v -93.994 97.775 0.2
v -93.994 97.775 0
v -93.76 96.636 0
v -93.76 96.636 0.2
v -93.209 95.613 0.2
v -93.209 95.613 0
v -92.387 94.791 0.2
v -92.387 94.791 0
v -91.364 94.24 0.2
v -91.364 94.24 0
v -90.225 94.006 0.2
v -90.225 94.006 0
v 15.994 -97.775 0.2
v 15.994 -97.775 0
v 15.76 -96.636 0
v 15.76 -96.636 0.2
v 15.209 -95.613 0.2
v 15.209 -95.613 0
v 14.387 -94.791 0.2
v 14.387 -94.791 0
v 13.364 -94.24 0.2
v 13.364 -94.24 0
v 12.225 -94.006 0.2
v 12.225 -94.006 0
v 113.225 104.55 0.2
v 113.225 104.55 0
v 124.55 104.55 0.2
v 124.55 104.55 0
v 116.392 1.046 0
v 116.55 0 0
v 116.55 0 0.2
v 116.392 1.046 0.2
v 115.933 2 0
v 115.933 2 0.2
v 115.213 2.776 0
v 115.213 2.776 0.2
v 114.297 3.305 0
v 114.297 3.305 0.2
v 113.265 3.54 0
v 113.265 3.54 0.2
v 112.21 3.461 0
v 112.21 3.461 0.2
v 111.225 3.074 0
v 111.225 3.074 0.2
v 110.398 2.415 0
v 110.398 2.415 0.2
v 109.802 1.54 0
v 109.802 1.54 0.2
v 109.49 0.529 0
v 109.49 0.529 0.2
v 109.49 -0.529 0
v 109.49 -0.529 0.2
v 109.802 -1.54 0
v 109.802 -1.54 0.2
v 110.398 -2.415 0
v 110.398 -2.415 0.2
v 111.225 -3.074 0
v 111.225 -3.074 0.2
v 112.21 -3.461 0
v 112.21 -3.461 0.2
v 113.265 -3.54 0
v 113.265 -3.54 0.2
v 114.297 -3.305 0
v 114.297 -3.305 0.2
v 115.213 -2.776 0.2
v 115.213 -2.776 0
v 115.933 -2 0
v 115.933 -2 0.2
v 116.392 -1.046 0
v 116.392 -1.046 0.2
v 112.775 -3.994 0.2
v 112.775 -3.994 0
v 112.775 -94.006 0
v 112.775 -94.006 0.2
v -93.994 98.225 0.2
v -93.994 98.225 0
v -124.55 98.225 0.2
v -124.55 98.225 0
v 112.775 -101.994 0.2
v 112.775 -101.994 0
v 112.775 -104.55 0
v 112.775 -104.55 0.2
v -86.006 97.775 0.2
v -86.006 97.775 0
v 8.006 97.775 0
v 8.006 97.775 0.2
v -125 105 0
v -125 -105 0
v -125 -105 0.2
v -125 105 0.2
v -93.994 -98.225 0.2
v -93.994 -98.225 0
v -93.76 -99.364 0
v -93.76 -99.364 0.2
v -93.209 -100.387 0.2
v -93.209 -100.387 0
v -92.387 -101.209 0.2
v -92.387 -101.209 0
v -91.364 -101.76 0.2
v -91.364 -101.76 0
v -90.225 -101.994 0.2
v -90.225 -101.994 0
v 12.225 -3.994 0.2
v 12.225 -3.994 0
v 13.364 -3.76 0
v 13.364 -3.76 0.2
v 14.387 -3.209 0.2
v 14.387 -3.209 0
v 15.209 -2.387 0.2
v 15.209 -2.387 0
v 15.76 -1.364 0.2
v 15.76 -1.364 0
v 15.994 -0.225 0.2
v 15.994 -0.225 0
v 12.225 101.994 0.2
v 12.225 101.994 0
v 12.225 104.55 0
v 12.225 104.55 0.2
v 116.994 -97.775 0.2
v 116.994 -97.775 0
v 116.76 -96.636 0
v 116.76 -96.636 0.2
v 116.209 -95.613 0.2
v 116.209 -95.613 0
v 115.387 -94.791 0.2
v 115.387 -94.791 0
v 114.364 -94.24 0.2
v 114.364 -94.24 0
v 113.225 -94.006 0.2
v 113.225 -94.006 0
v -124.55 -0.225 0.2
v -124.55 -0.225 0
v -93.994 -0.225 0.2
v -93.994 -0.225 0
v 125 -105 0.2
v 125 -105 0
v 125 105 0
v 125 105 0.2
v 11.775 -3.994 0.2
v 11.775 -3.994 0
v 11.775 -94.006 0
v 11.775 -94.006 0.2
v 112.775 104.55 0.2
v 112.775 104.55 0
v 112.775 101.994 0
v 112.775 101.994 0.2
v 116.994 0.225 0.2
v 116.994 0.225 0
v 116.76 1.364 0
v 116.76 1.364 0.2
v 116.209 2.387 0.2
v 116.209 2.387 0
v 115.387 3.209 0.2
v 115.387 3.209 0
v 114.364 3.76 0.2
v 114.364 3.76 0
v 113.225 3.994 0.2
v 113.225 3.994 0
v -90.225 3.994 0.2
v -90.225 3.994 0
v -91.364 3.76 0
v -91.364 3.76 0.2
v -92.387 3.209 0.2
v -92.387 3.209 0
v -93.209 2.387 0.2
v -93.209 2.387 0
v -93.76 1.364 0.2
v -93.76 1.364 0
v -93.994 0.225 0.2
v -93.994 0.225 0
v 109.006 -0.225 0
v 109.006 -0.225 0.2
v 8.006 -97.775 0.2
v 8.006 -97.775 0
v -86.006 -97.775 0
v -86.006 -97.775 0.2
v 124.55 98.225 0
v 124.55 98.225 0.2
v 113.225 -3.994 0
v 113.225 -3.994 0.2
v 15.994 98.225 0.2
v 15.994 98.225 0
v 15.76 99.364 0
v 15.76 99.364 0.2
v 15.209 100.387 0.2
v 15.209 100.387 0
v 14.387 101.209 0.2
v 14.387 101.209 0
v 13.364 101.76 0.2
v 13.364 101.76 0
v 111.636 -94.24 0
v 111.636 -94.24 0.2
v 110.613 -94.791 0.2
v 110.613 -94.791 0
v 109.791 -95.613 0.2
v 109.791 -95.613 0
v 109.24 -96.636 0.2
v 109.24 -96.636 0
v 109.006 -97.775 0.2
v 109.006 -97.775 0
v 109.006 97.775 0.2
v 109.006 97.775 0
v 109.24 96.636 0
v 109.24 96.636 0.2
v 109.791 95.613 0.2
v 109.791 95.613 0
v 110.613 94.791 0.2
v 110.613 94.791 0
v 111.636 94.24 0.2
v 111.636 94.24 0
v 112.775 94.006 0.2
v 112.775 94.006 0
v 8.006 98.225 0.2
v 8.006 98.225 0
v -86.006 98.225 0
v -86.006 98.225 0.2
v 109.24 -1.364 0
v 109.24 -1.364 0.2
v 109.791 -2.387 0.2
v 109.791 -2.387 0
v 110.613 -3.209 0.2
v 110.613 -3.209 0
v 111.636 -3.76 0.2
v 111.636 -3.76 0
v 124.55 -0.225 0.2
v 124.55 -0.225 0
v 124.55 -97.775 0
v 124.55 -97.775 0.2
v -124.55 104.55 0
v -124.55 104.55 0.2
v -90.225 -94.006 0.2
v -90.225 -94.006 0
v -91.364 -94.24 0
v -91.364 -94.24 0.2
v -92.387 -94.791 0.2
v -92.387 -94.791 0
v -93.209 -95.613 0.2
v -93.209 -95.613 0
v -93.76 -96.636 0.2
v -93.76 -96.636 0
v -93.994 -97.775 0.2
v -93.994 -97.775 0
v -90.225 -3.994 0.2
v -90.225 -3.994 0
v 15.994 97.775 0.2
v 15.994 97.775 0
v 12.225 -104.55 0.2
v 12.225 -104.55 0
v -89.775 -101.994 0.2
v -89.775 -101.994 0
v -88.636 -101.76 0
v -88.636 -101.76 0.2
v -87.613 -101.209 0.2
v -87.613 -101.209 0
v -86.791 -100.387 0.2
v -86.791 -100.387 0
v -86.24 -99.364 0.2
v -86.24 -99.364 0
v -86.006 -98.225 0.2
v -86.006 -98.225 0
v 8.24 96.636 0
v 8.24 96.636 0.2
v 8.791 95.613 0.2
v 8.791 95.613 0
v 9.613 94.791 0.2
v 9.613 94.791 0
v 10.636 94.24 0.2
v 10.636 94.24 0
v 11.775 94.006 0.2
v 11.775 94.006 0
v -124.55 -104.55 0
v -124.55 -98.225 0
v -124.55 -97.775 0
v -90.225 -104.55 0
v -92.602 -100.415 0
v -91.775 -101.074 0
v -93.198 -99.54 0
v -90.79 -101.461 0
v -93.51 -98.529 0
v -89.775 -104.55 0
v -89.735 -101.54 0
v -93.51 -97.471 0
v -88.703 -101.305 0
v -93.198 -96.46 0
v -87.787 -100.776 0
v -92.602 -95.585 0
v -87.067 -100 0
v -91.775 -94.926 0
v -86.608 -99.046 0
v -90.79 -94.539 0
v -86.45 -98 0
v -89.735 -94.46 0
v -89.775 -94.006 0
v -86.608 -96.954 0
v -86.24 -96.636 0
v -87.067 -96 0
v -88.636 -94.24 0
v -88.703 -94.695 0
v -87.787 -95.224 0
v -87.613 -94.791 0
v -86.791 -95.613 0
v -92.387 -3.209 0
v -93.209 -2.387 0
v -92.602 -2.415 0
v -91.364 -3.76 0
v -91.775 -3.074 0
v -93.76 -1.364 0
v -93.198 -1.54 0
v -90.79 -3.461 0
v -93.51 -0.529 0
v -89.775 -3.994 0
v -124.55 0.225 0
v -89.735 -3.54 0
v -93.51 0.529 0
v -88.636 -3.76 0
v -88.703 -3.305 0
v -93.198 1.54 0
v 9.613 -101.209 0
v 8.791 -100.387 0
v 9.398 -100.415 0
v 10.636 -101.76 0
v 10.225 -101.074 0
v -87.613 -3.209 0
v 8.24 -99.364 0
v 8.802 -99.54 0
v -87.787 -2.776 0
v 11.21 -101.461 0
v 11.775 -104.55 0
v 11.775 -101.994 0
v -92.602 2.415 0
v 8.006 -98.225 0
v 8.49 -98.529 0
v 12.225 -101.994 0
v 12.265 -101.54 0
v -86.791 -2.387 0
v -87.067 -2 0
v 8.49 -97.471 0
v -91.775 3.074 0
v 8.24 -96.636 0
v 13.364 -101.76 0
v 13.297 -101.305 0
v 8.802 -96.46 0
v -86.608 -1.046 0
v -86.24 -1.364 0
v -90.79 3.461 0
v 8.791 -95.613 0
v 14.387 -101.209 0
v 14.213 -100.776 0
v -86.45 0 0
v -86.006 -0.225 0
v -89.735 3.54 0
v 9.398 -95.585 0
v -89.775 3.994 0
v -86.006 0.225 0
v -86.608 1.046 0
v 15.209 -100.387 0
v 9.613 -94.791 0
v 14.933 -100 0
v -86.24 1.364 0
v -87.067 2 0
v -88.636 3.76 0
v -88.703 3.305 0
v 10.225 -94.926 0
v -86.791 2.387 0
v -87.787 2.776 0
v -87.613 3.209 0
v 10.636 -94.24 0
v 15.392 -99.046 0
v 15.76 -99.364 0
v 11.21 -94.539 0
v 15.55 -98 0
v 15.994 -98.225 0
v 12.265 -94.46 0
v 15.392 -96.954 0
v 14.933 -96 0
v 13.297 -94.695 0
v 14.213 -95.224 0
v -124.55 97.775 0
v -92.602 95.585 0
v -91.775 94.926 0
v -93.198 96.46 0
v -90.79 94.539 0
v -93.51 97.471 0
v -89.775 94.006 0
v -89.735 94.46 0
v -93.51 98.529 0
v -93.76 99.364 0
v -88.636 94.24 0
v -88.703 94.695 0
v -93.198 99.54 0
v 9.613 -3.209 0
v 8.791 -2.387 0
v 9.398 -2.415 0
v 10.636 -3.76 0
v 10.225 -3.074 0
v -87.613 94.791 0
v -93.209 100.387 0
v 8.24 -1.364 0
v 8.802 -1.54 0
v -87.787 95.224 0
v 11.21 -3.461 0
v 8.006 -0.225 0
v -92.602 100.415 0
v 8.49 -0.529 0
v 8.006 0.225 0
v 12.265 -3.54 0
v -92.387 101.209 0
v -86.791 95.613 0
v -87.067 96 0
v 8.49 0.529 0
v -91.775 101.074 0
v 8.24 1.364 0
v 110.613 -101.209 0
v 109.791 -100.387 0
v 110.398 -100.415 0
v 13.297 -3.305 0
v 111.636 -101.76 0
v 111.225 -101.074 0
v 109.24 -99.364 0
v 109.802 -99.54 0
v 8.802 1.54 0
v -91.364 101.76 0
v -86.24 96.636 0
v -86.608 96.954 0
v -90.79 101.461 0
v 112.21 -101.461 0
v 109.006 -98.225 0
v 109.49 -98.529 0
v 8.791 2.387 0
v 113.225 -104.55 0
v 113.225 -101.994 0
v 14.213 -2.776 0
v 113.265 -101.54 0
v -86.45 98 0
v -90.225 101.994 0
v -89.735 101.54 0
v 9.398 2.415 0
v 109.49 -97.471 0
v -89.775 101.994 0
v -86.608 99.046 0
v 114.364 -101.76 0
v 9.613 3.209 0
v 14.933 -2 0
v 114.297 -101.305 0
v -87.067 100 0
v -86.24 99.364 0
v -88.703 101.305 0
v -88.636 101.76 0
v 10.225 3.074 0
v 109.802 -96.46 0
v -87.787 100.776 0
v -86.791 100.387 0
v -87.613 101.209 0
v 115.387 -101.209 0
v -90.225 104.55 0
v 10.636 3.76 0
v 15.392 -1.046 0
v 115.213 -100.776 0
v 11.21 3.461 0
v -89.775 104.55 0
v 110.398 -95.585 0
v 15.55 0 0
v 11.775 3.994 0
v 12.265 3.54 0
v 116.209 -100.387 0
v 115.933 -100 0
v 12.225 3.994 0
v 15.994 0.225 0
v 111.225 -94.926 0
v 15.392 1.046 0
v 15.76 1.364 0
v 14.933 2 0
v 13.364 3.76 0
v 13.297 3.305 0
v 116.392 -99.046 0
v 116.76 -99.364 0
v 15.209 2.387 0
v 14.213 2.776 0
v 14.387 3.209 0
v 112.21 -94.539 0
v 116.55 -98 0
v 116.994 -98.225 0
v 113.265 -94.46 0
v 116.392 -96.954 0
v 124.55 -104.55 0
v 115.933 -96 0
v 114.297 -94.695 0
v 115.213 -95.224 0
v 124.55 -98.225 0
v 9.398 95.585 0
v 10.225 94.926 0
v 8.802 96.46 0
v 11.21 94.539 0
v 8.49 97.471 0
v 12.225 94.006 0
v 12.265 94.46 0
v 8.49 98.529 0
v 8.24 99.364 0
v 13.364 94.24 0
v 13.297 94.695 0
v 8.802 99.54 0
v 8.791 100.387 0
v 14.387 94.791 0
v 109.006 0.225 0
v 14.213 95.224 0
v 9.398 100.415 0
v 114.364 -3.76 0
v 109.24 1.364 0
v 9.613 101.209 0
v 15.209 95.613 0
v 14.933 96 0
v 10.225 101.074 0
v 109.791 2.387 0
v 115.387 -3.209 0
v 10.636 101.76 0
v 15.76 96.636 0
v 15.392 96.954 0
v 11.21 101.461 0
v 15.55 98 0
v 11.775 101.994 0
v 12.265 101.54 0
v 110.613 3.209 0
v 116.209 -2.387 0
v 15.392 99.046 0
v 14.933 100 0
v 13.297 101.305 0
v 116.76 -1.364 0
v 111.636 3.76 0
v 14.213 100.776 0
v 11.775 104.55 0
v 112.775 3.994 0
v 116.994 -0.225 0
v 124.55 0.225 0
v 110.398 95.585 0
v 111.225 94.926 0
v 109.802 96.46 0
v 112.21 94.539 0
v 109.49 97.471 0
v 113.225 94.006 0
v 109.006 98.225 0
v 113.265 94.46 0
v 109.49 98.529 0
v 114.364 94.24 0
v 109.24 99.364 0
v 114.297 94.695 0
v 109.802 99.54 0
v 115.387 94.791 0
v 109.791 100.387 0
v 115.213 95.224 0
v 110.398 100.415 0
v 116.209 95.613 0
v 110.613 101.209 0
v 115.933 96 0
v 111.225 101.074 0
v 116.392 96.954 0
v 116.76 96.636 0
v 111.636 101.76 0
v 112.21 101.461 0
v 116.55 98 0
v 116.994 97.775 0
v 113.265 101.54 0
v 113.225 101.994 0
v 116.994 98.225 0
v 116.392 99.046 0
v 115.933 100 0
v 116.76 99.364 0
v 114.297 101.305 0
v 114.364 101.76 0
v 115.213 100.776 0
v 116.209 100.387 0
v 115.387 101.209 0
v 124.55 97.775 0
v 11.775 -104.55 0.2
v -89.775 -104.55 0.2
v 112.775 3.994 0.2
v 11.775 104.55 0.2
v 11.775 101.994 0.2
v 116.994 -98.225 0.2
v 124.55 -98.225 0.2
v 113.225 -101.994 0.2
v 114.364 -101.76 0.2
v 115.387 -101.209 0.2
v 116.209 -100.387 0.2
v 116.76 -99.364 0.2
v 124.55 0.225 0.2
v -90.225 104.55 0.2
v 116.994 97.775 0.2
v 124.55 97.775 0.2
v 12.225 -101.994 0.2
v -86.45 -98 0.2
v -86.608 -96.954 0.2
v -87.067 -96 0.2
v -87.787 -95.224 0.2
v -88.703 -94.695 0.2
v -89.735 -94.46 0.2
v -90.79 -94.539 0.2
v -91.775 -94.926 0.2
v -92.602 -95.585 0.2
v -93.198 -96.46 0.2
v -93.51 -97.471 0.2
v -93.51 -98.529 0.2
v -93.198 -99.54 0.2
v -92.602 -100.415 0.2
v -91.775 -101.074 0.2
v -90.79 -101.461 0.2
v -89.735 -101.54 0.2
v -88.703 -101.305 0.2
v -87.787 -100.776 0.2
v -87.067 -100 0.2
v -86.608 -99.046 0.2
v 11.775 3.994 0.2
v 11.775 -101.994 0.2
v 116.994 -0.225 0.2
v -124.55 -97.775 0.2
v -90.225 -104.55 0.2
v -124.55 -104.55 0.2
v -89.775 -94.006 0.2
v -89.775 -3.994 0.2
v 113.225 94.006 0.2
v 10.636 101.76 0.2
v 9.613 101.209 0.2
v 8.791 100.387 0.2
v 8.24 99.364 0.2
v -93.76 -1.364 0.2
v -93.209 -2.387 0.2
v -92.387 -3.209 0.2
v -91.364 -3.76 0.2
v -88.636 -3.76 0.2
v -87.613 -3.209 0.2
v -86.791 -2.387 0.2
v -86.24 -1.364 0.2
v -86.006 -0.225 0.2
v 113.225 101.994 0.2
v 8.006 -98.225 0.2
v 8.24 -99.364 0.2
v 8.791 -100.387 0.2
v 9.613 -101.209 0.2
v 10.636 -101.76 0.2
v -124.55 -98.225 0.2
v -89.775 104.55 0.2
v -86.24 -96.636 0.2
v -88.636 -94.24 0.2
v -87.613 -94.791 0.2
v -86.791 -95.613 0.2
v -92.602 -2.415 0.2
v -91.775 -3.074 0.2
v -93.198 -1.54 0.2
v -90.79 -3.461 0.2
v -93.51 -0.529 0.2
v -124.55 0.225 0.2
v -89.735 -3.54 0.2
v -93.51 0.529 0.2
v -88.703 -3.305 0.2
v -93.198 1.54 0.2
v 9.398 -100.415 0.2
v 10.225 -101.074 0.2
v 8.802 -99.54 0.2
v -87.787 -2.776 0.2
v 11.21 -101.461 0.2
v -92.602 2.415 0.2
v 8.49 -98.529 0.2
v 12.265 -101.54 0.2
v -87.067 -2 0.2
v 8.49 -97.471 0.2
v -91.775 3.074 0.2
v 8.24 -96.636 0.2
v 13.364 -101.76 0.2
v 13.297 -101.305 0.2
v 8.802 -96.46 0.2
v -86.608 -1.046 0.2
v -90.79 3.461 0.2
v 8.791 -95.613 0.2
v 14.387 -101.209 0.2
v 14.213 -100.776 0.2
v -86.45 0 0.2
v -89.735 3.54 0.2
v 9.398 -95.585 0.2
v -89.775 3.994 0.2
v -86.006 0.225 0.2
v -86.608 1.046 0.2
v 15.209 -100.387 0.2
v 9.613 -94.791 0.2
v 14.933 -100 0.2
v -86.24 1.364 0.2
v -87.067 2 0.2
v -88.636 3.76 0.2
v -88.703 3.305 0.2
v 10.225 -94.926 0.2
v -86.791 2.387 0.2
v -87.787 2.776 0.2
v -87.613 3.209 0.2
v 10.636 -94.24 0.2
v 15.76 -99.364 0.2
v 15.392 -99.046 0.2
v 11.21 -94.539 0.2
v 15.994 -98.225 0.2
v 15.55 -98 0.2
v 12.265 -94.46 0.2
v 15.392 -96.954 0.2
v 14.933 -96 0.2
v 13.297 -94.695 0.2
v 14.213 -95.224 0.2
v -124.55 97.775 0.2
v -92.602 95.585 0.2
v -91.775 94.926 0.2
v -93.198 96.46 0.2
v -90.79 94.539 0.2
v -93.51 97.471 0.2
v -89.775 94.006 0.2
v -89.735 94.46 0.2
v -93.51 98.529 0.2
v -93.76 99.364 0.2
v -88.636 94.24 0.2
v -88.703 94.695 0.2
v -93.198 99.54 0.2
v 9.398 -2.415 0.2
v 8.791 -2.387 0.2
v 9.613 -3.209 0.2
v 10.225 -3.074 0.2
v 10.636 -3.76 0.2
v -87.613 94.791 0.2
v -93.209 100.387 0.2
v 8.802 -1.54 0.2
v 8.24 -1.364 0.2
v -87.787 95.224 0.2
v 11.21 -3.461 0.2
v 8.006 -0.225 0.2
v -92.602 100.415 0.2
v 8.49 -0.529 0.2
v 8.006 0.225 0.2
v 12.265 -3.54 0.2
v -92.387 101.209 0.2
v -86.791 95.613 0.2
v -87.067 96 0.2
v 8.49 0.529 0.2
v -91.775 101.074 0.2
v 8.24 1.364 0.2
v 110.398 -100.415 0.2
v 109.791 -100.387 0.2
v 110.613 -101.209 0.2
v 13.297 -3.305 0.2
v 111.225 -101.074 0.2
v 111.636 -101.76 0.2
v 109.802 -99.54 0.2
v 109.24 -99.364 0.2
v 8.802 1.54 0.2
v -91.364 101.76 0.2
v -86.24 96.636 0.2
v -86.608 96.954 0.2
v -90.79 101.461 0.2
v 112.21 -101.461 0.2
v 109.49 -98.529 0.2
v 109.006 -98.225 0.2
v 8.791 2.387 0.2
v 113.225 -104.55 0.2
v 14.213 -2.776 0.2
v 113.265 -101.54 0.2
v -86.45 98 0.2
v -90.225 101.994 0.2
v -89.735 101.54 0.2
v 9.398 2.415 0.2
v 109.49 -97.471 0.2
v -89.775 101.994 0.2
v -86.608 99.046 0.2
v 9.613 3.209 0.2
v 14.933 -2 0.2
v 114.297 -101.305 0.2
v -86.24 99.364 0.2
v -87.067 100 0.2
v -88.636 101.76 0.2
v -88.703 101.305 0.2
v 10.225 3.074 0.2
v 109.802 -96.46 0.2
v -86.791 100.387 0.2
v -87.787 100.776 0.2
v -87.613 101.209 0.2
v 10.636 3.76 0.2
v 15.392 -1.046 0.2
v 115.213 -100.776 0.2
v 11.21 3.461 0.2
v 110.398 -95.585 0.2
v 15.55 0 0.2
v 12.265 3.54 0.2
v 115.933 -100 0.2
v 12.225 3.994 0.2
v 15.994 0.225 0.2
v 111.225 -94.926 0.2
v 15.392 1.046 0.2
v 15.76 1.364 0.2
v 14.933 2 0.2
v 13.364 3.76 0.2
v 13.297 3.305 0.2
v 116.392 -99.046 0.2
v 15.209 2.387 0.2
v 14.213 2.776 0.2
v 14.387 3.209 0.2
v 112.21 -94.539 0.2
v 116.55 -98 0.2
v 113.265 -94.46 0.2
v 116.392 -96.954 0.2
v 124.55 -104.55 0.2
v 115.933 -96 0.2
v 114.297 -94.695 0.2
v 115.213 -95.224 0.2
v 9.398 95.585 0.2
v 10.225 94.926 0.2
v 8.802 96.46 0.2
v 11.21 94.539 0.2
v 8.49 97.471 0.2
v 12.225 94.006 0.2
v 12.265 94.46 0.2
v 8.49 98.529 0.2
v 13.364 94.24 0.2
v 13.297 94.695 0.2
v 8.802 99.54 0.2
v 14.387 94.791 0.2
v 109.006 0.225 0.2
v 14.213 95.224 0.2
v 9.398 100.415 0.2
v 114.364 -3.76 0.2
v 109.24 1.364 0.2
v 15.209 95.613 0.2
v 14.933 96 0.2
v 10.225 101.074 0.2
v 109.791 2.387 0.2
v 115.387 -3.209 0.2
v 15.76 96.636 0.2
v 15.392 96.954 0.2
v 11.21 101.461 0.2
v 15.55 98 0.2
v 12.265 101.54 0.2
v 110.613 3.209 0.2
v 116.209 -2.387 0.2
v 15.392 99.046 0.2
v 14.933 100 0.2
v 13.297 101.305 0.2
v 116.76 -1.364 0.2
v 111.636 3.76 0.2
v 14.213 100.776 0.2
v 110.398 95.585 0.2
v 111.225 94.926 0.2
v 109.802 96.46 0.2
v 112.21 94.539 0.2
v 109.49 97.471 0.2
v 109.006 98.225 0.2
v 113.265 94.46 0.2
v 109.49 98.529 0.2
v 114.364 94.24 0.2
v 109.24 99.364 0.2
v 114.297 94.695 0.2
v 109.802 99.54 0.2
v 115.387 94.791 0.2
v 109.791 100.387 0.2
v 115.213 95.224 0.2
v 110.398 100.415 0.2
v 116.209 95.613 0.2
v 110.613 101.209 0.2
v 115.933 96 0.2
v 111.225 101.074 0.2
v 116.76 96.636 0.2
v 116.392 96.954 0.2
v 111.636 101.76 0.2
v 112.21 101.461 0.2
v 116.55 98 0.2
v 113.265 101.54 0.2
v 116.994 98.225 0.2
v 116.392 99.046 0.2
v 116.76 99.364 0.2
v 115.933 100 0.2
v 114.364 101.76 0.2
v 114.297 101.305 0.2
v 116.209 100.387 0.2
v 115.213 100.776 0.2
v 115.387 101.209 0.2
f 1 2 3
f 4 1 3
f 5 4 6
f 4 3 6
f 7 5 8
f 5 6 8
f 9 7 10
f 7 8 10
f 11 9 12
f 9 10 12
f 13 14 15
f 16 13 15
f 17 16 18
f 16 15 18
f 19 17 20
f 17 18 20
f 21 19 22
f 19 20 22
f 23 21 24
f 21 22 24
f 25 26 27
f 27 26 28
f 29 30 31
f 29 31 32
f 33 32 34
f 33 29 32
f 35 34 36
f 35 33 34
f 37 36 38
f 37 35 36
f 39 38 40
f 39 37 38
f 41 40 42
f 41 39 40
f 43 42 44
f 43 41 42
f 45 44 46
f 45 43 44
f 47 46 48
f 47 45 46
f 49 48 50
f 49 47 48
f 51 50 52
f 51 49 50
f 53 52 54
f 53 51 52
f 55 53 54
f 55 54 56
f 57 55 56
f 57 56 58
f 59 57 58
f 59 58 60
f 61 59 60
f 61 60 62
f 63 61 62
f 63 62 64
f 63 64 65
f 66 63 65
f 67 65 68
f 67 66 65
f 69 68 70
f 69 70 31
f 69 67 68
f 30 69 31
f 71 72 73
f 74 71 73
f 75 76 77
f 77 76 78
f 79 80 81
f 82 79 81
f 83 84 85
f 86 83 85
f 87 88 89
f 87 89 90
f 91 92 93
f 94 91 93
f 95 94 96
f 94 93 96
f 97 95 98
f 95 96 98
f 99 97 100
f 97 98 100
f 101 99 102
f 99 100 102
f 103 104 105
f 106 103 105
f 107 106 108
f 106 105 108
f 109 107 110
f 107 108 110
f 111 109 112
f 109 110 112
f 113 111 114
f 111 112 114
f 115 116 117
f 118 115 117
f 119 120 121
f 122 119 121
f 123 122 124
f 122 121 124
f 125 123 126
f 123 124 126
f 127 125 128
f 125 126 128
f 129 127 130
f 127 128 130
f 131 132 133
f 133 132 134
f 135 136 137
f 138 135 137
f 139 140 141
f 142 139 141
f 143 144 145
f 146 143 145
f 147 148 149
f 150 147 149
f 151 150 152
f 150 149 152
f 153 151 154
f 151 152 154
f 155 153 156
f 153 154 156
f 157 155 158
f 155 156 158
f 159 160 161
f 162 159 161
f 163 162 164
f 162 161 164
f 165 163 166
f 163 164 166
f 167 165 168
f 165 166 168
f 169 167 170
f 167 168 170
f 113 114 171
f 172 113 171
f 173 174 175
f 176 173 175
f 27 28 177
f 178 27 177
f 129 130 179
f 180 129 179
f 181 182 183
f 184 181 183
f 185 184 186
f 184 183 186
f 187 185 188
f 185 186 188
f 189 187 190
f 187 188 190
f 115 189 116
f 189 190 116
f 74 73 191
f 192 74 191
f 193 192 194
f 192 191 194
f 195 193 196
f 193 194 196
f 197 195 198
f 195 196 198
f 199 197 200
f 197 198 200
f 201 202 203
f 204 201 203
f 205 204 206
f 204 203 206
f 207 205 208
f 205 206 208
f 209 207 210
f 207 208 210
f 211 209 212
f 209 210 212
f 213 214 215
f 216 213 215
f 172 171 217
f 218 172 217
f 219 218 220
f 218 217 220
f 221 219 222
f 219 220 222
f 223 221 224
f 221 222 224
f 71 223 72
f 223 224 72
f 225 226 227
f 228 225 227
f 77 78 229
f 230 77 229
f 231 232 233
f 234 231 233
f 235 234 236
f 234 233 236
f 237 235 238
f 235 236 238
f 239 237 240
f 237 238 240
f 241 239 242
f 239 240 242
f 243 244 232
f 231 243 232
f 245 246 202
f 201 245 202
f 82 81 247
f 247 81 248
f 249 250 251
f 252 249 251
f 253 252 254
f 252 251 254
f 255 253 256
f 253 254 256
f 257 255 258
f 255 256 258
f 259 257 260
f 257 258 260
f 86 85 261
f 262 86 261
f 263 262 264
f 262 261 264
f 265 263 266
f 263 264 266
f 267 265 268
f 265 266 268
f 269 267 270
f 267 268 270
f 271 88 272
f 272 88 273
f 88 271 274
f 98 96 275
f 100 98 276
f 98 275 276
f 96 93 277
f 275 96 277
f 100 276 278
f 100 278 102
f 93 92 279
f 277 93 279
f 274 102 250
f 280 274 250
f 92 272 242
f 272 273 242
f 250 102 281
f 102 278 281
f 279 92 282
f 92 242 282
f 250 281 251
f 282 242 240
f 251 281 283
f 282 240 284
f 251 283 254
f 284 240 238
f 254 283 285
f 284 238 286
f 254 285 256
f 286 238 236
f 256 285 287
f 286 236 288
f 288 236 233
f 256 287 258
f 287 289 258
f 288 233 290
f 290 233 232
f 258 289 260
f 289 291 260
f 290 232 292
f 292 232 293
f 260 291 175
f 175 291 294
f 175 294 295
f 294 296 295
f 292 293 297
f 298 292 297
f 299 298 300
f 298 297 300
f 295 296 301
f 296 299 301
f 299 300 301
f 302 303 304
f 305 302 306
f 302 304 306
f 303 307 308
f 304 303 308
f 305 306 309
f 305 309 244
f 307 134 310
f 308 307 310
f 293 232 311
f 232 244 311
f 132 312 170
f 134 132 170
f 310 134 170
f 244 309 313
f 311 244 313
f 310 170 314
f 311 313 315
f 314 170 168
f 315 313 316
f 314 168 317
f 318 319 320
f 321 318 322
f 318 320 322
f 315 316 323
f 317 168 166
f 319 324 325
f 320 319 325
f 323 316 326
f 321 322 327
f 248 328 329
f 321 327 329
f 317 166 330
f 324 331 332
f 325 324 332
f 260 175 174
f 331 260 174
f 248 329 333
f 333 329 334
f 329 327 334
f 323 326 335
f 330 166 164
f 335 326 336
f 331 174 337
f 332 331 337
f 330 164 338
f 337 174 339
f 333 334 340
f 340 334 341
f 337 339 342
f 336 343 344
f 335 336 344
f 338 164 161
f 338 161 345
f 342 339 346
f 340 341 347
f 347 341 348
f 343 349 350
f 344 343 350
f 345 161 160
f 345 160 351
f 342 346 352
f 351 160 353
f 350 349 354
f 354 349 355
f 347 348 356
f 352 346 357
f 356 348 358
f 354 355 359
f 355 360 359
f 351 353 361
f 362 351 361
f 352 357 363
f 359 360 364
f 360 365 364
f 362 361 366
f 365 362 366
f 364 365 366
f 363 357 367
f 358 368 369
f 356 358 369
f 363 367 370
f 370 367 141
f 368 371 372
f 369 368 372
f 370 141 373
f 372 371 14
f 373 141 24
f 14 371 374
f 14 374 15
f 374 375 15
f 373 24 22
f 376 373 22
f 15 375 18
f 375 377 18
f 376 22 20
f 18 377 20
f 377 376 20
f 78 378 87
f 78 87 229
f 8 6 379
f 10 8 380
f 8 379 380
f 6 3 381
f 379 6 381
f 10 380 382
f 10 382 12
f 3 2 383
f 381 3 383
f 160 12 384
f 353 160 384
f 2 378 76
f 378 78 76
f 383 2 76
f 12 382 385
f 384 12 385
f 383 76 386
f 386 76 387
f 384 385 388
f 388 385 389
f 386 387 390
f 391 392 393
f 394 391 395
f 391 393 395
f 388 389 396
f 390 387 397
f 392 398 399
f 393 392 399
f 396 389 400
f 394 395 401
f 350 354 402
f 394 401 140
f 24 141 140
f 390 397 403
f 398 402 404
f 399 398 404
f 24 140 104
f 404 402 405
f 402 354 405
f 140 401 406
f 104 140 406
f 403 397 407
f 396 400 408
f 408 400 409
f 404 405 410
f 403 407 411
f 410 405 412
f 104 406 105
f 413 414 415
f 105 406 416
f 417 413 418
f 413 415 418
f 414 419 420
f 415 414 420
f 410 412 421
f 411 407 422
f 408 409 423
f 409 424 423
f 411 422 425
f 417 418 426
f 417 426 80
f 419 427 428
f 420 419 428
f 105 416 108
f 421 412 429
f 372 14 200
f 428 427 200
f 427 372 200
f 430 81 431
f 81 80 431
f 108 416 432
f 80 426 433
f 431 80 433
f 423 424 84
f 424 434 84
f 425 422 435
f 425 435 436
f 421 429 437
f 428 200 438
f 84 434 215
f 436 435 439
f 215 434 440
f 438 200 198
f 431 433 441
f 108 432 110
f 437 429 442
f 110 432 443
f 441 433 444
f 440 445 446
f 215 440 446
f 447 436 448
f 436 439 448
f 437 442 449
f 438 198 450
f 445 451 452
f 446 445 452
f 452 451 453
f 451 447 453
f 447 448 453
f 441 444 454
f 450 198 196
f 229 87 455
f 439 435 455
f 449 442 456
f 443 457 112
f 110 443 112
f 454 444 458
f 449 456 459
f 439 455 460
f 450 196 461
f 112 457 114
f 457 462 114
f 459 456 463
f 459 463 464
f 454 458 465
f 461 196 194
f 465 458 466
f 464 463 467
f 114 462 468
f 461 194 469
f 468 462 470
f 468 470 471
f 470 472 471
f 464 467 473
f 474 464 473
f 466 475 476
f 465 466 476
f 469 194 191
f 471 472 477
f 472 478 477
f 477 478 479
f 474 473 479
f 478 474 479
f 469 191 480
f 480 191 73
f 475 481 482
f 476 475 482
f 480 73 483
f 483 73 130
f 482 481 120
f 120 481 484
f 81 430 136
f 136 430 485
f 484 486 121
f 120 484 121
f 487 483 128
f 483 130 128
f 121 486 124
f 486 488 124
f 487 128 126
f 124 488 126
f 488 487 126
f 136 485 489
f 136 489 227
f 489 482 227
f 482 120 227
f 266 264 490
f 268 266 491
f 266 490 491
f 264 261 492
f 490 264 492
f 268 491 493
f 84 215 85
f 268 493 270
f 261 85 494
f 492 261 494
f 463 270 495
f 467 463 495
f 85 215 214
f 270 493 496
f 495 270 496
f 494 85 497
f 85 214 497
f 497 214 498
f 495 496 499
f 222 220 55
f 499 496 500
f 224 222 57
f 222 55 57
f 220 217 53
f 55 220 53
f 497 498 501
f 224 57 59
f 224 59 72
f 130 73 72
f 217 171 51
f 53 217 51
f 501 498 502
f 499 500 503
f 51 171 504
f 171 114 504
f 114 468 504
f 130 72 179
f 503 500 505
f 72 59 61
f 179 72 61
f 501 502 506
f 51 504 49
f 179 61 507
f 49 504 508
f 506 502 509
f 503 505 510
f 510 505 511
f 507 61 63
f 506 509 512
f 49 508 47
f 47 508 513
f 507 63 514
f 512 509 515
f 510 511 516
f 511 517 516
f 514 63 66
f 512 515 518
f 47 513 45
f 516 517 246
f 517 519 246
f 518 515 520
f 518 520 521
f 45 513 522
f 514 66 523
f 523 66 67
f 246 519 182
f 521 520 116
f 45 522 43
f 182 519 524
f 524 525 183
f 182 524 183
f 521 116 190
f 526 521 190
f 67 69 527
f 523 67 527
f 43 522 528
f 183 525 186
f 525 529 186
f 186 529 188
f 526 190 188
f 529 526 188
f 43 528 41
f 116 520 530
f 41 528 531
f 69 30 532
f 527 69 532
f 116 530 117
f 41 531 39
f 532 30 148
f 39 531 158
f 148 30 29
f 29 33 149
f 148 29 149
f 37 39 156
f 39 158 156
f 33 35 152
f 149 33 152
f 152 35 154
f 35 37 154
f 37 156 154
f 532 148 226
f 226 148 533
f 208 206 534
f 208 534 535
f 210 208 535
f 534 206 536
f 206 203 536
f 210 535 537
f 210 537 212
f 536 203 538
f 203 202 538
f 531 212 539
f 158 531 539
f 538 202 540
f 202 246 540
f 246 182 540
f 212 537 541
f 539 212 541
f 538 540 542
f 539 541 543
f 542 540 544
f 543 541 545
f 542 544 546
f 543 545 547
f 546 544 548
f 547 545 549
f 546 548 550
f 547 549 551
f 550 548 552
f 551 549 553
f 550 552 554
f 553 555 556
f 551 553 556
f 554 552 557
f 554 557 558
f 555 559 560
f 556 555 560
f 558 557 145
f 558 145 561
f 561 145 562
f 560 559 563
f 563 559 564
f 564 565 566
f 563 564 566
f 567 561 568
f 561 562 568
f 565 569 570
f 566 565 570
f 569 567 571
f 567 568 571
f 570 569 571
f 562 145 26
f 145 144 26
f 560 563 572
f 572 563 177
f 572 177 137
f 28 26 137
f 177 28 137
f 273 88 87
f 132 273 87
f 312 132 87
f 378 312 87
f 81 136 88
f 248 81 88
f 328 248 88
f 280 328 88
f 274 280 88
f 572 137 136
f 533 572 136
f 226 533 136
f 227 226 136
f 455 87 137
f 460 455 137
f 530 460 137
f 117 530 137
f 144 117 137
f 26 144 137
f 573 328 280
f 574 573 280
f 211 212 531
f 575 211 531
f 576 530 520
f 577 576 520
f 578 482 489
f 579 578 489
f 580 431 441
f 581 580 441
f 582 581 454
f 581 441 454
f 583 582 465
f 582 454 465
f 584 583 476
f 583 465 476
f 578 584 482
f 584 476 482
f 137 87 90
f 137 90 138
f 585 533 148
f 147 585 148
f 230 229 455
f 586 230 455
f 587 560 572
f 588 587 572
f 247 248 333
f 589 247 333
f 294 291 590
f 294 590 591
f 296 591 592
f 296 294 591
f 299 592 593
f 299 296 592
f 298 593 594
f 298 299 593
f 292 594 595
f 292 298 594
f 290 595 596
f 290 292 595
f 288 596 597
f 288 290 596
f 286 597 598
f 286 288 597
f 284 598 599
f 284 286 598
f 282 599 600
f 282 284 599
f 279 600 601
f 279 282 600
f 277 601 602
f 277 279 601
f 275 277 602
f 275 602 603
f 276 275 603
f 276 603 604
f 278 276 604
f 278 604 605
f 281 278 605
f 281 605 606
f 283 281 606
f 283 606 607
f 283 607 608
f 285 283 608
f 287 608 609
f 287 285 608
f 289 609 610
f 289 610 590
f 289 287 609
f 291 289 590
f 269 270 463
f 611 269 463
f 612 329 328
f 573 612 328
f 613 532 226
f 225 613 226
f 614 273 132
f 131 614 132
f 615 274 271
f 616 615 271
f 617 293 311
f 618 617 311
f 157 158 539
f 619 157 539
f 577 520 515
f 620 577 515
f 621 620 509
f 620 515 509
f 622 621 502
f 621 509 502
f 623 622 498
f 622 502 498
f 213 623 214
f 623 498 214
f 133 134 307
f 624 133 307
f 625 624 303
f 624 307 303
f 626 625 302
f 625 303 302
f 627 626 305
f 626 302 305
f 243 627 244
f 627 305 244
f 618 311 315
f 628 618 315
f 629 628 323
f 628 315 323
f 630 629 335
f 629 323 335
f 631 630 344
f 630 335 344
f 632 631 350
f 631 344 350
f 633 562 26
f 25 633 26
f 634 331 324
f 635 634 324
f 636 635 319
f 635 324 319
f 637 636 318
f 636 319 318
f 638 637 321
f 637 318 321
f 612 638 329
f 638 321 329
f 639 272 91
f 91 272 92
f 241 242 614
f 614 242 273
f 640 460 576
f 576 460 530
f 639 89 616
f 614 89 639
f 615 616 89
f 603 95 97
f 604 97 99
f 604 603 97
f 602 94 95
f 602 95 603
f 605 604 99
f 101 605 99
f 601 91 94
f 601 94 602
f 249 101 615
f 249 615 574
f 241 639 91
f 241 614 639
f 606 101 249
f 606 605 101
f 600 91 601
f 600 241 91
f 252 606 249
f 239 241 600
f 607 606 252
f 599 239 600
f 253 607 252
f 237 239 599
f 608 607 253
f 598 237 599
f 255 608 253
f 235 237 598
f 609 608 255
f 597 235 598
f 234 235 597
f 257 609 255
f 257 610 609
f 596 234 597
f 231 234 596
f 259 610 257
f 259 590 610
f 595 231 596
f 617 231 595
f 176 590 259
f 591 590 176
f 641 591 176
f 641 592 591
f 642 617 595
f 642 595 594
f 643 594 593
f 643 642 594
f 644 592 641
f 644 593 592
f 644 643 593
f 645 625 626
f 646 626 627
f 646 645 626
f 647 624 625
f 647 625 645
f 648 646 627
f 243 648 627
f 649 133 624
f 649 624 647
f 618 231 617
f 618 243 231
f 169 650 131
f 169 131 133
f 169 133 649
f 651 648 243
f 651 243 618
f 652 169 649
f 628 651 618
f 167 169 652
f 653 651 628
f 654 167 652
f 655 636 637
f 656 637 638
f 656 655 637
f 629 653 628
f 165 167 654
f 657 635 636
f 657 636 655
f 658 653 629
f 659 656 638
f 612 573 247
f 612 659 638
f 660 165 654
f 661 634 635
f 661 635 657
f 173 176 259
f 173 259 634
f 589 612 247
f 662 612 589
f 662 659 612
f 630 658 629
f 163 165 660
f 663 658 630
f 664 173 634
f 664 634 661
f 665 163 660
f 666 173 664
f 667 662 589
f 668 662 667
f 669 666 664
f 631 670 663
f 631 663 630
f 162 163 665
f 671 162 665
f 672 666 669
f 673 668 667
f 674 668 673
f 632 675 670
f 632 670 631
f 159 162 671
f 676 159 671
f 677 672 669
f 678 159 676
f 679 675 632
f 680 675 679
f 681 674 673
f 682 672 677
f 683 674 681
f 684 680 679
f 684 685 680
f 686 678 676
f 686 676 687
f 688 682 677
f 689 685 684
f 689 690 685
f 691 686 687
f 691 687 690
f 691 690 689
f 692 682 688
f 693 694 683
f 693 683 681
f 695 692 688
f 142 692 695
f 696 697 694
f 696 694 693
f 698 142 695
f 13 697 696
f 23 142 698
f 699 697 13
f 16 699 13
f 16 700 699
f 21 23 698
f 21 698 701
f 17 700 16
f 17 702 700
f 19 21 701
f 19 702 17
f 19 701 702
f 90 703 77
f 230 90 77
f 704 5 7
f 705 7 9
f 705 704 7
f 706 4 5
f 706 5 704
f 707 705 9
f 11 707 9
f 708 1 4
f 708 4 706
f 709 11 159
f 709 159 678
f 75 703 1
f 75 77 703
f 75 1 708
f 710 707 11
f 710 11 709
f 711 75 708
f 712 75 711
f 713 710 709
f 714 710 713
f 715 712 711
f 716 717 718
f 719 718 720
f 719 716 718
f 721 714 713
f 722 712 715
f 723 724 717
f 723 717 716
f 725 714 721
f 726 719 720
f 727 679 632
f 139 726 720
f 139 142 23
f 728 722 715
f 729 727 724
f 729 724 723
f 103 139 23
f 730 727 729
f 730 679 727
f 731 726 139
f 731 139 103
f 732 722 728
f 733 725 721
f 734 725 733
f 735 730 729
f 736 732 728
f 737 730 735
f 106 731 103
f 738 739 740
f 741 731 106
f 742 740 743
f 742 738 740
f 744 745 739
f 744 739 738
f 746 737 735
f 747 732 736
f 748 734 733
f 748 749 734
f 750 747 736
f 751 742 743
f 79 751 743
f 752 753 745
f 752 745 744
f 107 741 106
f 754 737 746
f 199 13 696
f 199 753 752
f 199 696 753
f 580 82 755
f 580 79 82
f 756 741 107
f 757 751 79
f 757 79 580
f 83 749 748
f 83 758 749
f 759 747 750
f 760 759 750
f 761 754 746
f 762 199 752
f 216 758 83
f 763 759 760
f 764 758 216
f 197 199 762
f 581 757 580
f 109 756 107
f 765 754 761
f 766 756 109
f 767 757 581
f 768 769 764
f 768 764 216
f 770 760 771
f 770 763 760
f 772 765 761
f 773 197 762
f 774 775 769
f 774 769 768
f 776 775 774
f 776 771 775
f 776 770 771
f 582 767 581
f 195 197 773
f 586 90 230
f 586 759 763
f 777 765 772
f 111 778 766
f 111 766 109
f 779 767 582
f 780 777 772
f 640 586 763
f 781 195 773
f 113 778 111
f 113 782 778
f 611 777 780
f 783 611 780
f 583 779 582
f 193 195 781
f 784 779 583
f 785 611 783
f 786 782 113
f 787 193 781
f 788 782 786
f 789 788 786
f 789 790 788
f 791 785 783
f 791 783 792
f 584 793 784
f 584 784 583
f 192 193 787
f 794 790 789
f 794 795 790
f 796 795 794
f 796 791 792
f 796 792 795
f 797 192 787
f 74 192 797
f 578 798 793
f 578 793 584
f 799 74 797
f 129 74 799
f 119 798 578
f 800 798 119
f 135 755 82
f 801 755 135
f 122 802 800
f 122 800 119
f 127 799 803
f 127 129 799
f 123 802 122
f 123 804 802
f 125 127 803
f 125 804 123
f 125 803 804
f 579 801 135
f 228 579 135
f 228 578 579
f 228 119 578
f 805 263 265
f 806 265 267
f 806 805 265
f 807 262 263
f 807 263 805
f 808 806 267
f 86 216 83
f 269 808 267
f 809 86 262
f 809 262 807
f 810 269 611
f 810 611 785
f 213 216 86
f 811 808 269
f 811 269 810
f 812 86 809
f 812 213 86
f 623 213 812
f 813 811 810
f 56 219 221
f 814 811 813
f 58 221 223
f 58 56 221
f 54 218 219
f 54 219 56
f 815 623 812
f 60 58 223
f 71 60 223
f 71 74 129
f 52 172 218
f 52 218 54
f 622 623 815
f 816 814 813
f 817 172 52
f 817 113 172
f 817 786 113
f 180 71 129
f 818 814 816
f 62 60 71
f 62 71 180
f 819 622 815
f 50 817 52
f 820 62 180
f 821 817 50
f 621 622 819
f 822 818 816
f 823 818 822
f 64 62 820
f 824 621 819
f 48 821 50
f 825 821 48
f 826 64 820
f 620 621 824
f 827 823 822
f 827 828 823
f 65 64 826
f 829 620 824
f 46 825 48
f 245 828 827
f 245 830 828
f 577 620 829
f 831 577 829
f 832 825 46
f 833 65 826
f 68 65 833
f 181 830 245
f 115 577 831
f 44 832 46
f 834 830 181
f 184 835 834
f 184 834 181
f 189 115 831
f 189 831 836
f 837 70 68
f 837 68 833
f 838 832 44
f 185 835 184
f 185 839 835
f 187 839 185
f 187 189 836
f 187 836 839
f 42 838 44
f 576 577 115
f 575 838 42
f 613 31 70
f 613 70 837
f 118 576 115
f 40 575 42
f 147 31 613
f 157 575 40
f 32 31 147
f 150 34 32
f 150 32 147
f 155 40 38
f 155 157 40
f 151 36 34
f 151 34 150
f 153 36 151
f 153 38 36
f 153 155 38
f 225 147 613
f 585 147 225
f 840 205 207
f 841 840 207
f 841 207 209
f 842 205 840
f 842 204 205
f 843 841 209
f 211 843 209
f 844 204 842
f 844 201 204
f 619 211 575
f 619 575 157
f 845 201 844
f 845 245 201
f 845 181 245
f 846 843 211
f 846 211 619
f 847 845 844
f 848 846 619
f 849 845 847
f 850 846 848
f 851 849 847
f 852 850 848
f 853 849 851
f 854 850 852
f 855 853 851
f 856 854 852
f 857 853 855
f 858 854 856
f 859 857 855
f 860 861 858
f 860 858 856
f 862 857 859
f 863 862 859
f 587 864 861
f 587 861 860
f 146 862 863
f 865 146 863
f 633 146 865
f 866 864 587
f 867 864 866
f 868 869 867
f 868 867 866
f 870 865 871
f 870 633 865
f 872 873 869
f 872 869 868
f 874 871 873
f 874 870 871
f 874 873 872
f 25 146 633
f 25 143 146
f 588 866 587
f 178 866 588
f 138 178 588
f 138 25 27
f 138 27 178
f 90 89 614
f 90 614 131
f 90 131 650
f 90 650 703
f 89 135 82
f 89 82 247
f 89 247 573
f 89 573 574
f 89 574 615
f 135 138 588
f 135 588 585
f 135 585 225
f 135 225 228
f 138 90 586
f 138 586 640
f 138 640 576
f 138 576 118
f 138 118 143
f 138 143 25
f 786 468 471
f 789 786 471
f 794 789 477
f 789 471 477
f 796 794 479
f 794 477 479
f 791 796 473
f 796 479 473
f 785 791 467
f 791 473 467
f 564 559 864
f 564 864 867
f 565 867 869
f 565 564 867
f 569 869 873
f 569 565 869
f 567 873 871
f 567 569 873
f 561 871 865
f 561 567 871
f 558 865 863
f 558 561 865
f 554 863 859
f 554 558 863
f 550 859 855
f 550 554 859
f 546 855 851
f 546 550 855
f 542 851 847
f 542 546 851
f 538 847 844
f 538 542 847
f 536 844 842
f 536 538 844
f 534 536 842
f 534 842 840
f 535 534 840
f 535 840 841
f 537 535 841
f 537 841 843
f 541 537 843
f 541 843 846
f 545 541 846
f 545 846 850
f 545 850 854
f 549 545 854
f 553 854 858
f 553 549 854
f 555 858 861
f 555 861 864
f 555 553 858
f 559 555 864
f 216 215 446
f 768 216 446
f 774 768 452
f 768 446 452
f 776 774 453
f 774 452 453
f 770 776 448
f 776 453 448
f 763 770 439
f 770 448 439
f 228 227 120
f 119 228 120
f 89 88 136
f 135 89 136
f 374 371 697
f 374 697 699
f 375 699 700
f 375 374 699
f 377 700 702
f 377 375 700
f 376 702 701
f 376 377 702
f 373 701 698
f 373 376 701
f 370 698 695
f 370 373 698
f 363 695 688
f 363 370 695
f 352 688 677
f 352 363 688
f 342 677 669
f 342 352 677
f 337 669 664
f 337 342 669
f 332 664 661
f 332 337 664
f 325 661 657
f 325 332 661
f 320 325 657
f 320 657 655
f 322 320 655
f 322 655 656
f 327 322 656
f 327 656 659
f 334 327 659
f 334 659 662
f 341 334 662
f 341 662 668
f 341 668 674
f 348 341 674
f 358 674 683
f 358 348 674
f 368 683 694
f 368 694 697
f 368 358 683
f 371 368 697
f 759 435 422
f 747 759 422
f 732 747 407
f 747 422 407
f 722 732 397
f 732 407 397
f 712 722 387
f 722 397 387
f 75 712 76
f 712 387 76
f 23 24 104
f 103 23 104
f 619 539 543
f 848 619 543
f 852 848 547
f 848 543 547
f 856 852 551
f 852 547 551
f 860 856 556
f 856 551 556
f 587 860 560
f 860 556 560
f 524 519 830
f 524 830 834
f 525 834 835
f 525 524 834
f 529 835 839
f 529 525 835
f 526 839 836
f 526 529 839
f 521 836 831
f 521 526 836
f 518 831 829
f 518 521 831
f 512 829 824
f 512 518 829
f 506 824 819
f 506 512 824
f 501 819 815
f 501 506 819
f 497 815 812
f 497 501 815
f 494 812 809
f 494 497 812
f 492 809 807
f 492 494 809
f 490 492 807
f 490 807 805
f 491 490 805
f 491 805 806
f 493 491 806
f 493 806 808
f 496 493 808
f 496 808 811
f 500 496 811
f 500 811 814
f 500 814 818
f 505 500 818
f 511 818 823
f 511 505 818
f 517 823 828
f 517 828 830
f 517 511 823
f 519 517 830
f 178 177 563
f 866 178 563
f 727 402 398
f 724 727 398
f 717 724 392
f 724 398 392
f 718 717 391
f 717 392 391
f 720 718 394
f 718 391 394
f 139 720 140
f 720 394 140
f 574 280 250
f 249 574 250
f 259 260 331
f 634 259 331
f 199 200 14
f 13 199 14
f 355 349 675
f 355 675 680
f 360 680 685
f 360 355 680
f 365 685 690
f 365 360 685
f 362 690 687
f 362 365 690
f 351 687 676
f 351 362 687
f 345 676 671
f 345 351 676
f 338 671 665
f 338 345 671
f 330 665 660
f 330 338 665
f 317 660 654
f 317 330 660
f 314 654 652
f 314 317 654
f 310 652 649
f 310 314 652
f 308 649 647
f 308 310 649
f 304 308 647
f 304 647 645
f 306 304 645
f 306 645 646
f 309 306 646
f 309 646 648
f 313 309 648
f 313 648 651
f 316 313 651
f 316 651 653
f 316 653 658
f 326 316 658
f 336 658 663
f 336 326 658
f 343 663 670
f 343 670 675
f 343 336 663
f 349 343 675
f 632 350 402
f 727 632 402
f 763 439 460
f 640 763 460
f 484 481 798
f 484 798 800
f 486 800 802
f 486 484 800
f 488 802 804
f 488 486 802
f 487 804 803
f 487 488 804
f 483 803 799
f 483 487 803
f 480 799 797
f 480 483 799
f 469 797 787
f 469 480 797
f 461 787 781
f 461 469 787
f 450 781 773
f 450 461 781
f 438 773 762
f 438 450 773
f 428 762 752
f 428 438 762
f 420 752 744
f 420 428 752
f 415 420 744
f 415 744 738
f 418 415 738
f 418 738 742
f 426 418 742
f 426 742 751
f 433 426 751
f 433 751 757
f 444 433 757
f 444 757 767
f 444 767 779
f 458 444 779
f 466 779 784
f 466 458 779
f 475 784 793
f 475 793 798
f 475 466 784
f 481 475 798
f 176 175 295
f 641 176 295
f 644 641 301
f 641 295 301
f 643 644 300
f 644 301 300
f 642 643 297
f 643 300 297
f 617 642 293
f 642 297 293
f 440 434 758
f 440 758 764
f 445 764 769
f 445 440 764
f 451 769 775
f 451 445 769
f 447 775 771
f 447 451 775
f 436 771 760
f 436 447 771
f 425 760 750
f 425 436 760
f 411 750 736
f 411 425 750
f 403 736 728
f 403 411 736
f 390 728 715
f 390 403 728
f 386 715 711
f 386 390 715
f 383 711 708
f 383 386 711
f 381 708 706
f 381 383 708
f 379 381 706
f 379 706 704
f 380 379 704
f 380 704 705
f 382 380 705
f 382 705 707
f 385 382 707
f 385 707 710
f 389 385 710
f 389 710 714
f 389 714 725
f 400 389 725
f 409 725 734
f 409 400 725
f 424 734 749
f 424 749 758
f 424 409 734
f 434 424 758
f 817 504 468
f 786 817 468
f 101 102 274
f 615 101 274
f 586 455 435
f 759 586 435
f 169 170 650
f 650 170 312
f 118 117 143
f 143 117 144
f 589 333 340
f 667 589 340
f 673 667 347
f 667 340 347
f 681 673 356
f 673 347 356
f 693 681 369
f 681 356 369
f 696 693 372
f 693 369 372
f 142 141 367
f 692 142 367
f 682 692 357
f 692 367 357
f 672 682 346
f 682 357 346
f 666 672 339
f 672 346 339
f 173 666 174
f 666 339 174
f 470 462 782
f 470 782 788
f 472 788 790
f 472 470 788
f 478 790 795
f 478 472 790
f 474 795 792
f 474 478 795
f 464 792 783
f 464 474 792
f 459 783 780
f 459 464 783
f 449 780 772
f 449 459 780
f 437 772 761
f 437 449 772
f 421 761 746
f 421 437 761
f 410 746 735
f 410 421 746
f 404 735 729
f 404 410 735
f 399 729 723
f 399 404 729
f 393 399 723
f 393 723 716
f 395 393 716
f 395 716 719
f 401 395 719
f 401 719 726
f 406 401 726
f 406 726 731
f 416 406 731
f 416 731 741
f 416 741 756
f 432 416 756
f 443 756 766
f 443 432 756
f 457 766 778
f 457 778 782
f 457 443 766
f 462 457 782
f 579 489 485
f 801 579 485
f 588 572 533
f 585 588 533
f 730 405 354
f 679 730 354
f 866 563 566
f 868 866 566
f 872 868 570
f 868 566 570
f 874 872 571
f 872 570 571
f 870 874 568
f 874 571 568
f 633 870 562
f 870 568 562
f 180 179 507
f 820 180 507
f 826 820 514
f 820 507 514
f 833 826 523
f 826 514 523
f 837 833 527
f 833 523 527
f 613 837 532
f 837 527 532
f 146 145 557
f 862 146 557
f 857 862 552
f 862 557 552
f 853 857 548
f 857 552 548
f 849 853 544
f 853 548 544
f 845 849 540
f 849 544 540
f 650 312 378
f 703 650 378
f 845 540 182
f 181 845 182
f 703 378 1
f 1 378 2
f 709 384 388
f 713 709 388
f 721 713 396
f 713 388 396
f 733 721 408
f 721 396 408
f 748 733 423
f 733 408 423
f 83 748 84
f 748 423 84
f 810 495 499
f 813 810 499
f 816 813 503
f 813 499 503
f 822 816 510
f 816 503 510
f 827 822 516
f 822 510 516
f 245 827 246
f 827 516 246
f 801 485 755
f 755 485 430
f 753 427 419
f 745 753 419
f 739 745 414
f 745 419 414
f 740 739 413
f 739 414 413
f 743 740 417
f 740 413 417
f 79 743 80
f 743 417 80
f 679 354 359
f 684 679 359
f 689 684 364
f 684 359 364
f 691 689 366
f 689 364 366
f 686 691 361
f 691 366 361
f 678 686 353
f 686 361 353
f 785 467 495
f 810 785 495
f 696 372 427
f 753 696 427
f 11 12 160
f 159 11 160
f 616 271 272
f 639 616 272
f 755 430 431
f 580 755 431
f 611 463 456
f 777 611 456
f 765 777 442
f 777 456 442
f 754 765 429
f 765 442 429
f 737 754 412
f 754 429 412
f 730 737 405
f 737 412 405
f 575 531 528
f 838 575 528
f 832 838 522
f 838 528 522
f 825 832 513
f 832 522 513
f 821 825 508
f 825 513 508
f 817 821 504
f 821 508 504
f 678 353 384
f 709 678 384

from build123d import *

# Parameters (mm, degrees)
F0_W     = 250
F0_H     = 210
F0_R     = 3.55
F1_DEPTH = 0.2


with BuildPart() as f1:
    # F0 (on Top) → F1 (new body)
    with BuildSketch(Plane.XY):
        Rectangle(F0_W, F0_H)
        with BuildLine():
            Line((-90.225, -104.55), (-124.55, -104.55))
            Line((-124.55, -104.55), (-124.55, -98.225))
            Line((-124.55, -98.225), (-93.993667, -98.225))
            ThreePointArc((-93.993667, -98.225), (-92.828427, -100.828427), (-90.225, -101.993667))
            Line((-90.225, -101.993667), (-90.225, -104.55))
        make_face(mode=Mode.SUBTRACT)
        with Locations((-90, -98)):
            Circle(F0_R, mode=Mode.SUBTRACT)
        with BuildLine():
            Line((-86.006333, -98.225), (8.006333, -98.225))
            ThreePointArc((8.006333, -98.225), (9.171573, -100.828427), (11.775, -101.993667))
            Line((11.775, -101.993667), (11.775, -104.55))
            Line((11.775, -104.55), (-89.775, -104.55))
            Line((-89.775, -104.55), (-89.775, -101.993667))
            ThreePointArc((-89.775, -101.993667), (-87.171573, -100.828427), (-86.006333, -98.225))
        make_face(mode=Mode.SUBTRACT)
        with BuildLine():
            Line((-124.55, -0.225), (-93.993667, -0.225))
            ThreePointArc((-93.993667, -0.225), (-92.828427, -2.828427), (-90.225, -3.993667))
            Line((-90.225, -3.993667), (-90.225, -94.006333))
            ThreePointArc((-90.225, -94.006333), (-92.828427, -95.171573), (-93.993667, -97.775))
            Line((-93.993667, -97.775), (-124.55, -97.775))
            Line((-124.55, -97.775), (-124.55, -0.225))
        make_face(mode=Mode.SUBTRACT)
        with BuildLine():
            Line((-86.006333, -0.225), (8.006333, -0.225))
            ThreePointArc((8.006333, -0.225), (9.171573, -2.828427), (11.775, -3.993667))
            Line((11.775, -3.993667), (11.775, -94.006333))
            ThreePointArc((11.775, -94.006333), (9.171573, -95.171573), (8.006333, -97.775))
            Line((8.006333, -97.775), (-86.006333, -97.775))
            ThreePointArc((-86.006333, -97.775), (-87.171573, -95.171573), (-89.775, -94.006333))
            Line((-89.775, -94.006333), (-89.775, -3.993667))
            ThreePointArc((-89.775, -3.993667), (-87.171573, -2.828427), (-86.006333, -0.225))
        make_face(mode=Mode.SUBTRACT)
        with Locations((12, -98)):
            Circle(F0_R, mode=Mode.SUBTRACT)
        with BuildLine():
            Line((12.225, -104.55), (12.225, -101.993667))
            ThreePointArc((12.225, -101.993667), (14.828427, -100.828427), (15.993667, -98.225))
            Line((15.993667, -98.225), (109.006333, -98.225))
            ThreePointArc((109.006333, -98.225), (110.171573, -100.828427), (112.775, -101.993667))
            Line((112.775, -101.993667), (112.775, -104.55))
            Line((112.775, -104.55), (12.225, -104.55))
        make_face(mode=Mode.SUBTRACT)
        with BuildLine():
            Line((124.55, -98.225), (124.55, -104.55))
            Line((124.55, -104.55), (113.225, -104.55))
            Line((113.225, -104.55), (113.225, -101.993667))
            ThreePointArc((113.225, -101.993667), (115.828427, -100.828427), (116.993667, -98.225))
            Line((116.993667, -98.225), (124.55, -98.225))
        make_face(mode=Mode.SUBTRACT)
        with Locations((113, -98)):
            Circle(F0_R, mode=Mode.SUBTRACT)
        with BuildLine():
            Line((15.993667, -0.225), (109.006333, -0.225))
            ThreePointArc((109.006333, -0.225), (110.171573, -2.828427), (112.775, -3.993667))
            Line((112.775, -3.993667), (112.775, -94.006333))
            ThreePointArc((112.775, -94.006333), (110.171573, -95.171573), (109.006333, -97.775))
            Line((109.006333, -97.775), (15.993667, -97.775))
            ThreePointArc((15.993667, -97.775), (14.828427, -95.171573), (12.225, -94.006333))
            Line((12.225, -94.006333), (12.225, -3.993667))
            ThreePointArc((12.225, -3.993667), (14.828427, -2.828427), (15.993667, -0.225))
        make_face(mode=Mode.SUBTRACT)
        with BuildLine():
            Line((116.993667, -0.225), (124.55, -0.225))
            Line((124.55, -0.225), (124.55, -97.775))
            Line((124.55, -97.775), (116.993667, -97.775))
            ThreePointArc((116.993667, -97.775), (115.828427, -95.171573), (113.225, -94.006333))
            Line((113.225, -94.006333), (113.225, -3.993667))
            ThreePointArc((113.225, -3.993667), (115.828427, -2.828427), (116.993667, -0.225))
        make_face(mode=Mode.SUBTRACT)
        with Locations((-90, 0)):
            Circle(F0_R, mode=Mode.SUBTRACT)
        with BuildLine():
            Line((-124.55, 97.775), (-93.993667, 97.775))
            ThreePointArc((-93.993667, 97.775), (-92.828427, 95.171573), (-90.225, 94.006333))
            Line((-90.225, 94.006333), (-90.225, 3.993667))
            ThreePointArc((-90.225, 3.993667), (-92.828427, 2.828427), (-93.993667, 0.225))
            Line((-93.993667, 0.225), (-124.55, 0.225))
            Line((-124.55, 0.225), (-124.55, 97.775))
        make_face(mode=Mode.SUBTRACT)
        with BuildLine():
            Line((-86.006333, 97.775), (8.006333, 97.775))
            ThreePointArc((8.006333, 97.775), (9.171573, 95.171573), (11.775, 94.006333))
            Line((11.775, 94.006333), (11.775, 3.993667))
            ThreePointArc((11.775, 3.993667), (9.171573, 2.828427), (8.006333, 0.225))
            Line((8.006333, 0.225), (-86.006333, 0.225))
            ThreePointArc((-86.006333, 0.225), (-87.171573, 2.828427), (-89.775, 3.993667))
            Line((-89.775, 3.993667), (-89.775, 94.006333))
            ThreePointArc((-89.775, 94.006333), (-87.171573, 95.171573), (-86.006333, 97.775))
        make_face(mode=Mode.SUBTRACT)
        with BuildLine():
            Line((-90.225, 104.55), (-90.225, 101.993667))
            ThreePointArc((-90.225, 101.993667), (-92.828427, 100.828427), (-93.993667, 98.225))
            Line((-93.993667, 98.225), (-124.55, 98.225))
            Line((-124.55, 98.225), (-124.55, 104.55))
            Line((-124.55, 104.55), (-90.225, 104.55))
        make_face(mode=Mode.SUBTRACT)
        with Locations((-90, 98)):
            Circle(F0_R, mode=Mode.SUBTRACT)
        with BuildLine():
            Line((-89.775, 101.993667), (-89.775, 104.55))
            Line((-89.775, 104.55), (11.775, 104.55))
            Line((11.775, 104.55), (11.775, 101.993667))
            ThreePointArc((11.775, 101.993667), (9.171573, 100.828427), (8.006333, 98.225))
            Line((8.006333, 98.225), (-86.006333, 98.225))
            ThreePointArc((-86.006333, 98.225), (-87.171573, 100.828427), (-89.775, 101.993667))
        make_face(mode=Mode.SUBTRACT)
        with Locations((12, 0)):
            Circle(F0_R, mode=Mode.SUBTRACT)
        with Locations((113, 0)):
            Circle(F0_R, mode=Mode.SUBTRACT)
        with BuildLine():
            Line((15.993667, 97.775), (109.006333, 97.775))
            ThreePointArc((109.006333, 97.775), (110.171573, 95.171573), (112.775, 94.006333))
            Line((112.775, 94.006333), (112.775, 3.993667))
            ThreePointArc((112.775, 3.993667), (110.171573, 2.828427), (109.006333, 0.225))
            Line((109.006333, 0.225), (15.993667, 0.225))
            ThreePointArc((15.993667, 0.225), (14.828427, 2.828427), (12.225, 3.993667))
            Line((12.225, 3.993667), (12.225, 94.006333))
            ThreePointArc((12.225, 94.006333), (14.828427, 95.171573), (15.993667, 97.775))
        make_face(mode=Mode.SUBTRACT)
        with BuildLine():
            Line((116.993667, 97.775), (124.55, 97.775))
            Line((124.55, 97.775), (124.55, 0.225))
            Line((124.55, 0.225), (116.993667, 0.225))
            ThreePointArc((116.993667, 0.225), (115.828427, 2.828427), (113.225, 3.993667))
            Line((113.225, 3.993667), (113.225, 94.006333))
            ThreePointArc((113.225, 94.006333), (115.828427, 95.171573), (116.993667, 97.775))
        make_face(mode=Mode.SUBTRACT)
        with Locations((12, 98)):
            Circle(F0_R, mode=Mode.SUBTRACT)
        with BuildLine():
            Line((12.225, 101.993667), (12.225, 104.55))
            Line((12.225, 104.55), (112.775, 104.55))
            Line((112.775, 104.55), (112.775, 101.993667))
            ThreePointArc((112.775, 101.993667), (110.171573, 100.828427), (109.006333, 98.225))
            Line((109.006333, 98.225), (15.993667, 98.225))
            ThreePointArc((15.993667, 98.225), (14.828427, 100.828427), (12.225, 101.993667))
        make_face(mode=Mode.SUBTRACT)
        with Locations((113, 98)):
            Circle(F0_R, mode=Mode.SUBTRACT)
        with BuildLine():
            Line((113.225, 104.55), (124.55, 104.55))
            Line((124.55, 104.55), (124.55, 98.225))
            Line((124.55, 98.225), (116.993667, 98.225))
            ThreePointArc((116.993667, 98.225), (115.828427, 100.828427), (113.225, 101.993667))
            Line((113.225, 101.993667), (113.225, 104.55))
        make_face(mode=Mode.SUBTRACT)
    extrude(amount=F1_DEPTH)


solid = f1.part
